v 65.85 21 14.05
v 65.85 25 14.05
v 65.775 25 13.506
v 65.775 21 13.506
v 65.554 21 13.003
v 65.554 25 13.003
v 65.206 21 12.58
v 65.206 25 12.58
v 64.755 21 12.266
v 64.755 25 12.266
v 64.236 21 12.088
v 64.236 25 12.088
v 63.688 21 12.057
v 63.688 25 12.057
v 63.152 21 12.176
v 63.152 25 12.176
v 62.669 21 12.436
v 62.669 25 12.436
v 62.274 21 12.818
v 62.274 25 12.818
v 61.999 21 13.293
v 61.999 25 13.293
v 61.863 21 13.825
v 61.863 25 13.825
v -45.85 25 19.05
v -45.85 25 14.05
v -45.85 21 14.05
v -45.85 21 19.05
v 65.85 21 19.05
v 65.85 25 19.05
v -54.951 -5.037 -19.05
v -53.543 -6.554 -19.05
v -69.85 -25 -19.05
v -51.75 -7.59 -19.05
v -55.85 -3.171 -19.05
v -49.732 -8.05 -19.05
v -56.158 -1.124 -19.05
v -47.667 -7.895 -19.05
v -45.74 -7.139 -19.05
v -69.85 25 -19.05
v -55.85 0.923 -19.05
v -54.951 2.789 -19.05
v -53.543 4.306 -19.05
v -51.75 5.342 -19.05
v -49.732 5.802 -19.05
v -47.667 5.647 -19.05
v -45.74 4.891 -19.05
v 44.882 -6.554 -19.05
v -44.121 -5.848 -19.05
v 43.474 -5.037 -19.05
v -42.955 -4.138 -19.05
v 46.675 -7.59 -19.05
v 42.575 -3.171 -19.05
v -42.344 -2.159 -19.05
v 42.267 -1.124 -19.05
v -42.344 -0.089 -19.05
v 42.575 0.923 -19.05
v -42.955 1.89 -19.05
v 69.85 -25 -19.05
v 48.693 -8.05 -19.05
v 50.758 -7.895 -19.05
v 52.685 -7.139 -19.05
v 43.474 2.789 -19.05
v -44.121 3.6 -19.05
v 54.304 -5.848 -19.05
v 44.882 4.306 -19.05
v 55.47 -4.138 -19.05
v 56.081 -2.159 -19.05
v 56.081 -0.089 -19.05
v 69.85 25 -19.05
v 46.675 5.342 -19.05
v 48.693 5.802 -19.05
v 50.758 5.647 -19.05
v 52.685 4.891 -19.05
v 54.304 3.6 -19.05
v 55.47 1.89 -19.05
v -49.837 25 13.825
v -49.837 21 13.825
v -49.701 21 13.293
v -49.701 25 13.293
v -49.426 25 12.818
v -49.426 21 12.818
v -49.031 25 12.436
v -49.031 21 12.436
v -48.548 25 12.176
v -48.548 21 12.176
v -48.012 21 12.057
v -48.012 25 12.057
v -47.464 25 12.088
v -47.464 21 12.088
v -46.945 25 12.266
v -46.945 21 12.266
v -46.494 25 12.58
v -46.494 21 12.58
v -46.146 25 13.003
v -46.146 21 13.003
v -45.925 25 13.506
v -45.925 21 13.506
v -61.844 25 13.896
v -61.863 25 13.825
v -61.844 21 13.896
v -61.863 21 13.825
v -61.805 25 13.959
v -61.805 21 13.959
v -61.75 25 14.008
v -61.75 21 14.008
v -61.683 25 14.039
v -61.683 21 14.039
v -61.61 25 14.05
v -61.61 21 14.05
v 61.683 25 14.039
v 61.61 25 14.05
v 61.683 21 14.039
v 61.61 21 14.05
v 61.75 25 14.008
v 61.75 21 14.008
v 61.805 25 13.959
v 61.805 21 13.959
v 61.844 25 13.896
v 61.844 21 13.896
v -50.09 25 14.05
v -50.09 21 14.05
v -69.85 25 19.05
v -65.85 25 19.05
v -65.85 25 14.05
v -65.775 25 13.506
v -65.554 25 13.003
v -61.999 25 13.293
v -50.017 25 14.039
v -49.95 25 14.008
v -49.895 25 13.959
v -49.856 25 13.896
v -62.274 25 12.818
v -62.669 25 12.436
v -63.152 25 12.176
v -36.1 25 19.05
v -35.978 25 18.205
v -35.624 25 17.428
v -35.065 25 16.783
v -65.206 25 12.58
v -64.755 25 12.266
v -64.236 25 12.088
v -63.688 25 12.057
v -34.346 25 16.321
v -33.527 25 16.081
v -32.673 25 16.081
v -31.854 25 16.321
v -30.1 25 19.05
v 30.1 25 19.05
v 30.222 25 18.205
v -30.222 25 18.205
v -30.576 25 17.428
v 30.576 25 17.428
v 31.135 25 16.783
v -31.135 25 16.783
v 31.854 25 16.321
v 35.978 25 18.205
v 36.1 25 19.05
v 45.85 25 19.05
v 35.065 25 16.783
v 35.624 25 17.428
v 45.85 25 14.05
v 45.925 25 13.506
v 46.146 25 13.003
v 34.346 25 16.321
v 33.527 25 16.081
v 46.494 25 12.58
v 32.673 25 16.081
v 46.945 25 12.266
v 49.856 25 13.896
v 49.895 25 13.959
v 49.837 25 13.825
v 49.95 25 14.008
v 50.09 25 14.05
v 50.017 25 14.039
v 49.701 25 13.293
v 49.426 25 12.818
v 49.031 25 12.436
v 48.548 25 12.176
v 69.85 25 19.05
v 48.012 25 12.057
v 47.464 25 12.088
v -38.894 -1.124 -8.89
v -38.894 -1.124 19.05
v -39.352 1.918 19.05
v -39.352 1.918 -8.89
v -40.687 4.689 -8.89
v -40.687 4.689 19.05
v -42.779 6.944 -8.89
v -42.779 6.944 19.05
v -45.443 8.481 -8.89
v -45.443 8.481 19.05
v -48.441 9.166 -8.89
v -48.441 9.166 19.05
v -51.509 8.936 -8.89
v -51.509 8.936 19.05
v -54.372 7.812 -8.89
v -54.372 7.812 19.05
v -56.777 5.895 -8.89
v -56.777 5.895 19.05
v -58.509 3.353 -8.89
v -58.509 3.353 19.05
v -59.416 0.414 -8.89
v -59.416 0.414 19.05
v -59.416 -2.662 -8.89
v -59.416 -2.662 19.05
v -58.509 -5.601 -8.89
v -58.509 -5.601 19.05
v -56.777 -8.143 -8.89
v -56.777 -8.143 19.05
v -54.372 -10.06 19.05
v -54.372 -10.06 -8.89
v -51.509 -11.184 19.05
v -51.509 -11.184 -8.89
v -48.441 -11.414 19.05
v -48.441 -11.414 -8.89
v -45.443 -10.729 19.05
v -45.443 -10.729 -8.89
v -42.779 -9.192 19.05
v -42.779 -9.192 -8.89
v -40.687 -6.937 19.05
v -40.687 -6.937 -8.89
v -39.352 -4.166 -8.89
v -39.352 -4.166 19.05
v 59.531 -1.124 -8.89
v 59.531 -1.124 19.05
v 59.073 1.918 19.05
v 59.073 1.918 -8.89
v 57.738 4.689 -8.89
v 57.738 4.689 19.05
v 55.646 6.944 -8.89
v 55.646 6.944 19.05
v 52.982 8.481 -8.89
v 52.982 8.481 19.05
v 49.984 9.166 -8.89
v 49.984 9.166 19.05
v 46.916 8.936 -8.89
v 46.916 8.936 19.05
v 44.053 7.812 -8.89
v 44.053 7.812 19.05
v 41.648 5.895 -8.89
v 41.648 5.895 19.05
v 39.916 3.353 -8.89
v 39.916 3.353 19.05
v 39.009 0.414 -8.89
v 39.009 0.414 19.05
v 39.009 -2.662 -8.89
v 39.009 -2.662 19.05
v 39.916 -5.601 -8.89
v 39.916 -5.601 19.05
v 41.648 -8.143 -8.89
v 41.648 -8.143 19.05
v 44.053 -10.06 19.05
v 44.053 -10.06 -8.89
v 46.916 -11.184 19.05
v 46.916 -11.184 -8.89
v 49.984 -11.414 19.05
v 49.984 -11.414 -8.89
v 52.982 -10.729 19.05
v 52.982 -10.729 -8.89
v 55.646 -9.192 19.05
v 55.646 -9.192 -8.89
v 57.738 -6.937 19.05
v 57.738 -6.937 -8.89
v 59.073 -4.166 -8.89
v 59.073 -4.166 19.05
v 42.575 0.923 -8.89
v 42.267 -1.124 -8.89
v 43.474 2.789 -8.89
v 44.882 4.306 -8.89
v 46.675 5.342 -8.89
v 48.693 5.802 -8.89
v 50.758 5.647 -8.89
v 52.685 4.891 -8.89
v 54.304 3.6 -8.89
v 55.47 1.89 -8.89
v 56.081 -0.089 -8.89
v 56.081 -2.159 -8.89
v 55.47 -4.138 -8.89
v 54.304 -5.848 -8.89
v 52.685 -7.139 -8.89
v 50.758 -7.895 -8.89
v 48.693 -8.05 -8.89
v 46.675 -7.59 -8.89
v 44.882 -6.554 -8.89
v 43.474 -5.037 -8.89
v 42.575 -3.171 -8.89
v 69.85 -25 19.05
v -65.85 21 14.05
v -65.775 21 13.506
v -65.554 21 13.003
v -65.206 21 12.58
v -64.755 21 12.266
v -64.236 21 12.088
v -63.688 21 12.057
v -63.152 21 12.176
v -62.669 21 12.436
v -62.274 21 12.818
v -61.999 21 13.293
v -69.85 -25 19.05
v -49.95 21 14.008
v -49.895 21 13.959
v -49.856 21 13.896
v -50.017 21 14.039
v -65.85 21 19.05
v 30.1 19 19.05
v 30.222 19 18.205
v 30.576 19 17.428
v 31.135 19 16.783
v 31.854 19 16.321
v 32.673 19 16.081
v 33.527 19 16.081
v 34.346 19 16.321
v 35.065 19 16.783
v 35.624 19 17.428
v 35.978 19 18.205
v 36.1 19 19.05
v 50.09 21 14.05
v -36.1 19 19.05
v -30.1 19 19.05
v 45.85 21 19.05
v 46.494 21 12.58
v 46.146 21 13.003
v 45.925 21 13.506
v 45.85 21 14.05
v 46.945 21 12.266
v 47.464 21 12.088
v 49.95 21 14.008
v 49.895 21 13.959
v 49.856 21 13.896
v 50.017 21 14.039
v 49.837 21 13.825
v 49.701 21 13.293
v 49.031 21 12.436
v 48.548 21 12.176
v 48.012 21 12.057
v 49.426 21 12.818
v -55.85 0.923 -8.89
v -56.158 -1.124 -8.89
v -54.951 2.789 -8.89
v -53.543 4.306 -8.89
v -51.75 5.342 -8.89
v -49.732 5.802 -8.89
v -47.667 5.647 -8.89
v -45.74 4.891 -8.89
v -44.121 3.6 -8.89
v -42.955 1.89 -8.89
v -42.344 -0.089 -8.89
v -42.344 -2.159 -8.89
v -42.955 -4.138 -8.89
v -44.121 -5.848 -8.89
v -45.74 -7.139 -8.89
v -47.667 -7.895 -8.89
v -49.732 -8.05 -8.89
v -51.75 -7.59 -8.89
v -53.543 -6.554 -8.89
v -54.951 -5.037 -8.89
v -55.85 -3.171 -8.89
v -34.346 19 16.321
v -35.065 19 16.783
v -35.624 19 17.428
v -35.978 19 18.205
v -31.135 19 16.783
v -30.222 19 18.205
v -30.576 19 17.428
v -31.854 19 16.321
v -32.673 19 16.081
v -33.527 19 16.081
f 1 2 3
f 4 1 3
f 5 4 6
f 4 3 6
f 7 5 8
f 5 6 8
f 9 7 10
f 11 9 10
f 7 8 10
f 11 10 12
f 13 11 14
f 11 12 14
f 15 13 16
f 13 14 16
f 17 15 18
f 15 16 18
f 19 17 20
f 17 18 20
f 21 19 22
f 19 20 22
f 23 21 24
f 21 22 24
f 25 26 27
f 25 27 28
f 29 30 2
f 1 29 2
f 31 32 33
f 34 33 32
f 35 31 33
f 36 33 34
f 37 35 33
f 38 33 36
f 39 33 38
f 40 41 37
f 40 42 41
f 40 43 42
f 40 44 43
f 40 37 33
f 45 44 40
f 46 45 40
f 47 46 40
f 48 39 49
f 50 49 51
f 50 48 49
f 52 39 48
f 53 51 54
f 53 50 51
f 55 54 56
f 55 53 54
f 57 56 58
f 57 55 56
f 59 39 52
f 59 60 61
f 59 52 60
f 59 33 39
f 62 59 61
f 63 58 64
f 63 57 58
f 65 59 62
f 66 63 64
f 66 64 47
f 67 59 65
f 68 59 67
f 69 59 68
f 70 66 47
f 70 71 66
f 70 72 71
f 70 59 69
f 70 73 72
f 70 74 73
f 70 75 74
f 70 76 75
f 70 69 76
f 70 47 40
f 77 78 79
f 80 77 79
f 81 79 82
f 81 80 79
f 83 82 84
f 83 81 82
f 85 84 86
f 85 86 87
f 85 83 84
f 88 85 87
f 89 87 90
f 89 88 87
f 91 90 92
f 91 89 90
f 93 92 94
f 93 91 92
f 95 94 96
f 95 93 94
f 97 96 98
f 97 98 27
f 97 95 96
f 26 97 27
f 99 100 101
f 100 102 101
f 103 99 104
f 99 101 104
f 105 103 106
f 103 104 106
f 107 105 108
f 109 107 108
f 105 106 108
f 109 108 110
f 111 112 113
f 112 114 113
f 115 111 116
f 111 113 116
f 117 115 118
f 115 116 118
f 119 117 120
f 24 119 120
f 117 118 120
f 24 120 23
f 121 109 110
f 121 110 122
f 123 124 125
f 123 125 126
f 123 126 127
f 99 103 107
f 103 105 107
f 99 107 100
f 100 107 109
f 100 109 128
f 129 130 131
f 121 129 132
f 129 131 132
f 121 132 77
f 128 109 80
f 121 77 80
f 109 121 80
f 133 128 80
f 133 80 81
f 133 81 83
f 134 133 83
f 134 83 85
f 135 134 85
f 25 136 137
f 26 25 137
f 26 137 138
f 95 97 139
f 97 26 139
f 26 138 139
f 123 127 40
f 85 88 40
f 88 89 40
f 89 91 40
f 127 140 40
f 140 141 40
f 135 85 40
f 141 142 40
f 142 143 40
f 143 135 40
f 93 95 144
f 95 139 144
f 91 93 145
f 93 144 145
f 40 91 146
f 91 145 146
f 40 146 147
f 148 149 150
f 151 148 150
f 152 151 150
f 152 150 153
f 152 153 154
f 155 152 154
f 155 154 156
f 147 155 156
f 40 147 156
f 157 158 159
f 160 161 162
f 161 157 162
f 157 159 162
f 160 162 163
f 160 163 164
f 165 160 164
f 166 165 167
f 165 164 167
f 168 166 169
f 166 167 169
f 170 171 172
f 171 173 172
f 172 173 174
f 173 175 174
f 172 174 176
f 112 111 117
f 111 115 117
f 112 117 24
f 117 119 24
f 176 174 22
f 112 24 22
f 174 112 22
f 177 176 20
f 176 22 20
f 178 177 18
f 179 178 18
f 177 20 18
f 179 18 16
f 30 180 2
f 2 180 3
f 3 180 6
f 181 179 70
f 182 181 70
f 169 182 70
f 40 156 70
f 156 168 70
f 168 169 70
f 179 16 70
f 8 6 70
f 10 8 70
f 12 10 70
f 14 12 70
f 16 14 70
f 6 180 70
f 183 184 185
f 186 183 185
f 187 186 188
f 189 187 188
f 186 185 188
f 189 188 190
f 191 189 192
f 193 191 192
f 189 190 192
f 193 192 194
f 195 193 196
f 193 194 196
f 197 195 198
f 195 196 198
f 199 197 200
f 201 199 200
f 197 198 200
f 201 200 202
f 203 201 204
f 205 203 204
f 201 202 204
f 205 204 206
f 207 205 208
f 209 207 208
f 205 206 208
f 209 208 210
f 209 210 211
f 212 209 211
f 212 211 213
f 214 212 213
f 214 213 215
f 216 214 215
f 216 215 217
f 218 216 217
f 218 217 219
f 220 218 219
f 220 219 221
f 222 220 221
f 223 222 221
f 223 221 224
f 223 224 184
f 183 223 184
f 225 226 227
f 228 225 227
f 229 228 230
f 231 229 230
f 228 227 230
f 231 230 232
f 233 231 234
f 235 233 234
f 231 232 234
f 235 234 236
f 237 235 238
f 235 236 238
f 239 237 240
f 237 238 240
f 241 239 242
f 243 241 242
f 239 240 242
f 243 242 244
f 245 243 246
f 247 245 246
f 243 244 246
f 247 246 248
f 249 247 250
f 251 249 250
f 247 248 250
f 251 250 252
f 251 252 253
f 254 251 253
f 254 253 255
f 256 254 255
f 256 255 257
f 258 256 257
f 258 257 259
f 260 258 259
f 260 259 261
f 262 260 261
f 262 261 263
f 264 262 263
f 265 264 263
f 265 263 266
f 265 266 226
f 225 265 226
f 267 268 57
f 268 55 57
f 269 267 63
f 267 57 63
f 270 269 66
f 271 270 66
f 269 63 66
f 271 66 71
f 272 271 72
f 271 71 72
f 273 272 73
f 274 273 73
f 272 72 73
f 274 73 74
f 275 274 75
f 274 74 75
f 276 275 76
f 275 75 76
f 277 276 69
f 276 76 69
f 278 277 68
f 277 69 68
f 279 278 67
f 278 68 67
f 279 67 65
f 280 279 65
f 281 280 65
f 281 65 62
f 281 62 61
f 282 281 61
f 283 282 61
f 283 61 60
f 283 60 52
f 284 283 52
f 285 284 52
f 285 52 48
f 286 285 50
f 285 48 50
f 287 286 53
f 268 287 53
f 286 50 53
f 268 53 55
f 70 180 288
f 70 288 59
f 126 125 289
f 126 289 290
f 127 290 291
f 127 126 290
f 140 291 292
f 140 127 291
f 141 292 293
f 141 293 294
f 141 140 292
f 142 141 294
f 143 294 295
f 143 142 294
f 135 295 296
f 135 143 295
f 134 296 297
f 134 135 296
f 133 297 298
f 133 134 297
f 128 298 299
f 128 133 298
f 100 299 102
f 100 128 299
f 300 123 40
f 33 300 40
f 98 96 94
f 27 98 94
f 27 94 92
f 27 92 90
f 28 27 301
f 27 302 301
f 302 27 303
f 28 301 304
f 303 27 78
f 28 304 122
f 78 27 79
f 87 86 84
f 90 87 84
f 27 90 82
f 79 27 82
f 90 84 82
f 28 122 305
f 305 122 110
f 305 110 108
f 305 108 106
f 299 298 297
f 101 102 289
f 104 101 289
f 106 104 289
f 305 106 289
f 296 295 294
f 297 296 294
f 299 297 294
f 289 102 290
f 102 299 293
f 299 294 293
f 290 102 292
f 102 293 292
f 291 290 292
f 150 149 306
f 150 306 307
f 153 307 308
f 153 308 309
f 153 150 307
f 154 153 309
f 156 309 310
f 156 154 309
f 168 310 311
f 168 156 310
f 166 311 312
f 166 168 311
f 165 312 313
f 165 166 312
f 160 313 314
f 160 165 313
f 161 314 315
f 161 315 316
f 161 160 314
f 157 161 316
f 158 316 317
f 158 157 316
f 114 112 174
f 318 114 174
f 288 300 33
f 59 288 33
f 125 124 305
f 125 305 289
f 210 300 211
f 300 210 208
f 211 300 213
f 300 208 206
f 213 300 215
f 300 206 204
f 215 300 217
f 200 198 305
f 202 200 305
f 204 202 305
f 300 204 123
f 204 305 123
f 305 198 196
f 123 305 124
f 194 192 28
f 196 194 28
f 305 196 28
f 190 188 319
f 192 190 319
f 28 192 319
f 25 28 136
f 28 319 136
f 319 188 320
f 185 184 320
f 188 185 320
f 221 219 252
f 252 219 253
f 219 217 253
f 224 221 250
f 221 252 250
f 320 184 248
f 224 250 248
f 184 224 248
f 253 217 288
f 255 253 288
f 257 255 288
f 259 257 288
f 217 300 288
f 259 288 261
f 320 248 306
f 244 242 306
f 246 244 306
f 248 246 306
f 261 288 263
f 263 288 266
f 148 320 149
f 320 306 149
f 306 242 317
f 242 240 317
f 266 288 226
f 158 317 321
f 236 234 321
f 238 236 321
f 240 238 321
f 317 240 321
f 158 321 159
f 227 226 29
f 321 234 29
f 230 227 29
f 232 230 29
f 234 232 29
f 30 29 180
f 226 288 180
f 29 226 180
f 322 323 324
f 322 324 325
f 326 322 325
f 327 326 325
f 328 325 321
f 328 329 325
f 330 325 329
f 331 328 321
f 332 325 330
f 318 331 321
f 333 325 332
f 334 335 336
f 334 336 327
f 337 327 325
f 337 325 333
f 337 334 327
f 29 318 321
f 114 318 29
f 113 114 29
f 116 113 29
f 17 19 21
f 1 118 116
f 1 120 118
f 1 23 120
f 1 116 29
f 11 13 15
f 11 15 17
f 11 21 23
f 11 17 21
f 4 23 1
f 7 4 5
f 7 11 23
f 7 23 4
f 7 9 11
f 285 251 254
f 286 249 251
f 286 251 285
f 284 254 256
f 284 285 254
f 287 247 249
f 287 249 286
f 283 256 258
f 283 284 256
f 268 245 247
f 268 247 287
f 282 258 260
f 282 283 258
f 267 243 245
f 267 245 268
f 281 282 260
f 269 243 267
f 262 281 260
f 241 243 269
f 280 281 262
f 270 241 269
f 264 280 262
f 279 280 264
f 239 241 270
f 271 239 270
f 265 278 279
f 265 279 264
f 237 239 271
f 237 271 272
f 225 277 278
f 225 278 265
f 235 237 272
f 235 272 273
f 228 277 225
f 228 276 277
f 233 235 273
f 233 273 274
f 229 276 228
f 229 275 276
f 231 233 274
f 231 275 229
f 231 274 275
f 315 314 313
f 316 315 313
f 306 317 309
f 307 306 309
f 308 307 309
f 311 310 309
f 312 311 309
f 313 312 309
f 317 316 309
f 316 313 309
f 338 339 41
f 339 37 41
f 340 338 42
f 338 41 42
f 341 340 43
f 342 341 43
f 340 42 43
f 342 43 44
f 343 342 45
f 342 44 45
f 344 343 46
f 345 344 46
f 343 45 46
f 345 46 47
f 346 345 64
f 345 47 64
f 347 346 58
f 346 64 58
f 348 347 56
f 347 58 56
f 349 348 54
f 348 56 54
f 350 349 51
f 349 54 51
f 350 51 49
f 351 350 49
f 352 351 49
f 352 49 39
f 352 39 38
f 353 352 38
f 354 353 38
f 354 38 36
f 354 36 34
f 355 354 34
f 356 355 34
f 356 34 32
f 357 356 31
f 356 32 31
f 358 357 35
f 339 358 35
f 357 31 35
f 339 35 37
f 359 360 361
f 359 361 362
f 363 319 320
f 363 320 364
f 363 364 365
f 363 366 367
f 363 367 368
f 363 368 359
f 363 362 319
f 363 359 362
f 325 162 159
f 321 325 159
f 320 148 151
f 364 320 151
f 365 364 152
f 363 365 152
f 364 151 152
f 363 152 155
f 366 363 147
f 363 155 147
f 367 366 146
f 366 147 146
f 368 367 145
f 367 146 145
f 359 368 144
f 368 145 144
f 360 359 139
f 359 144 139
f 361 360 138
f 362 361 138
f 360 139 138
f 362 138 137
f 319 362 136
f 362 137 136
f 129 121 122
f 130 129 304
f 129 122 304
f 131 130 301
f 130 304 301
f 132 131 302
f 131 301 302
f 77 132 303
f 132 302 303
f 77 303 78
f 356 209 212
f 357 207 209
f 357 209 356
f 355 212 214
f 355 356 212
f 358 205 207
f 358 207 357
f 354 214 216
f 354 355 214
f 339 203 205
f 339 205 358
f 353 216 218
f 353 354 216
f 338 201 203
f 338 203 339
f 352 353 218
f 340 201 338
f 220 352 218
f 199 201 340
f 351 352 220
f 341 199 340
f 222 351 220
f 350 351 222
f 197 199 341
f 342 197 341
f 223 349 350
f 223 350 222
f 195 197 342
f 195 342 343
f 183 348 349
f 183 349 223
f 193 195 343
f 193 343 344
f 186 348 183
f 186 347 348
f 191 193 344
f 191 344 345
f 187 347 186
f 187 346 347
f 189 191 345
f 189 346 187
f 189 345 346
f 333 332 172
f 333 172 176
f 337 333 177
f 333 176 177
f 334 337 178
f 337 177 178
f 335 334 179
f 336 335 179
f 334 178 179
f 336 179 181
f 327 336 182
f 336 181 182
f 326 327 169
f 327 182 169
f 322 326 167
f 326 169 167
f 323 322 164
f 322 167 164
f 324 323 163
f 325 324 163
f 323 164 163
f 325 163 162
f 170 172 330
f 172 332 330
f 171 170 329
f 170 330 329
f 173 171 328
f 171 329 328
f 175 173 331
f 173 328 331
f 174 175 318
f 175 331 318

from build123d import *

# Parameters (mm, degrees)
SKETCH1_W                                        = 38.1
SKETCH1_H                                        = 50
BOSS_EXTRUDE1_DEPTH                              = 69.85
CBORE_FOR_1_2_SOCKET_HEAD_CAP_SCREW1_D           = 13.89126
CBORE_FOR_1_2_SOCKET_HEAD_CAP_SCREW1_CBORE_D     = 20.6375
CBORE_FOR_1_2_SOCKET_HEAD_CAP_SCREW1_CBORE_DEPTH = 27.94
CUT_EXTRUDE1_DEPTH                               = 6
CUT_EXTRUDE2_DEPTH                               = 4
FILLET1_R                                        = 0.254


with BuildPart() as part:
    # Sketch1 → Boss-Extrude1 (new body, symmetric)
    with BuildSketch(Plane(origin=(0, 0, 0), x_dir=(0, 0, -1), z_dir=(1, 0, 0))):
        Rectangle(SKETCH1_W, SKETCH1_H)
    extrude(amount=BOSS_EXTRUDE1_DEPTH, both=True)

    # CBORE for 1/2 Socket Head Cap Screw1 (through all)
    with Locations(Plane.XY.offset(19.05)):
        with Locations((-49.2125, -1.124), (49.2125, -1.124)):
            CounterBoreHole(CBORE_FOR_1_2_SOCKET_HEAD_CAP_SCREW1_D / 2, CBORE_FOR_1_2_SOCKET_HEAD_CAP_SCREW1_CBORE_D / 2, CBORE_FOR_1_2_SOCKET_HEAD_CAP_SCREW1_CBORE_DEPTH)

    # Sketch5 → Cut-Extrude1 (cut)
    with BuildSketch(Plane(origin=(0, 25, 0), x_dir=(1, 0, 0), z_dir=(0, 1, 0))):
        with BuildLine():
            Line((-36.1, -19.05), (-30.1, -19.05))
            ThreePointArc((-30.1, -19.05), (-33.1, -16.05), (-36.1, -19.05))
        make_face()
        with BuildLine():
            Line((36.1, -19.05), (30.1, -19.05))
            ThreePointArc((30.1, -19.05), (33.1, -16.05), (36.1, -19.05))
        make_face()
    extrude(amount=-CUT_EXTRUDE1_DEPTH, mode=Mode.SUBTRACT)

    # Sketch7 → Cut-Extrude2 (cut)
    with BuildSketch(Plane(origin=(0, 25, 0), x_dir=(1, 0, 0), z_dir=(0, 1, 0))):
        with BuildLine():
            Line((45.85, -14.05), (45.85, -19.05))
            Line((45.85, -19.05), (65.85, -19.05))
            Line((65.85, -19.05), (65.85, -14.05))
            ThreePointArc((65.85, -14.05), (63.85, -12.05), (61.85, -14.05))
            Line((61.85, -14.05), (49.85, -14.05))
            ThreePointArc((49.85, -14.05), (47.85, -12.05), (45.85, -14.05))
        make_face()
        with BuildLine():
            Line((-61.85, -14.05), (-49.85, -14.05))
            ThreePointArc((-49.85, -14.05), (-47.85, -12.05), (-45.85, -14.05))
            Line((-45.85, -14.05), (-45.85, -19.05))
            Line((-45.85, -19.05), (-65.85, -19.05))
            Line((-65.85, -19.05), (-65.85, -14.05))
            ThreePointArc((-65.85, -14.05), (-63.85, -12.05), (-61.85, -14.05))
        make_face()
    extrude(amount=-CUT_EXTRUDE2_DEPTH, mode=Mode.SUBTRACT)

    # Fillet1
    fillet1_edges = [part.edges().sort_by_distance(p)[0] for p in [
        (49.85, 23, 14.05),
        (61.85, 23, 14.05),
        (-61.85, 23, 14.05),
        (-49.85, 23, 14.05),
    ]]
    fillet(fillet1_edges, radius=FILLET1_R)


solid = part.part
